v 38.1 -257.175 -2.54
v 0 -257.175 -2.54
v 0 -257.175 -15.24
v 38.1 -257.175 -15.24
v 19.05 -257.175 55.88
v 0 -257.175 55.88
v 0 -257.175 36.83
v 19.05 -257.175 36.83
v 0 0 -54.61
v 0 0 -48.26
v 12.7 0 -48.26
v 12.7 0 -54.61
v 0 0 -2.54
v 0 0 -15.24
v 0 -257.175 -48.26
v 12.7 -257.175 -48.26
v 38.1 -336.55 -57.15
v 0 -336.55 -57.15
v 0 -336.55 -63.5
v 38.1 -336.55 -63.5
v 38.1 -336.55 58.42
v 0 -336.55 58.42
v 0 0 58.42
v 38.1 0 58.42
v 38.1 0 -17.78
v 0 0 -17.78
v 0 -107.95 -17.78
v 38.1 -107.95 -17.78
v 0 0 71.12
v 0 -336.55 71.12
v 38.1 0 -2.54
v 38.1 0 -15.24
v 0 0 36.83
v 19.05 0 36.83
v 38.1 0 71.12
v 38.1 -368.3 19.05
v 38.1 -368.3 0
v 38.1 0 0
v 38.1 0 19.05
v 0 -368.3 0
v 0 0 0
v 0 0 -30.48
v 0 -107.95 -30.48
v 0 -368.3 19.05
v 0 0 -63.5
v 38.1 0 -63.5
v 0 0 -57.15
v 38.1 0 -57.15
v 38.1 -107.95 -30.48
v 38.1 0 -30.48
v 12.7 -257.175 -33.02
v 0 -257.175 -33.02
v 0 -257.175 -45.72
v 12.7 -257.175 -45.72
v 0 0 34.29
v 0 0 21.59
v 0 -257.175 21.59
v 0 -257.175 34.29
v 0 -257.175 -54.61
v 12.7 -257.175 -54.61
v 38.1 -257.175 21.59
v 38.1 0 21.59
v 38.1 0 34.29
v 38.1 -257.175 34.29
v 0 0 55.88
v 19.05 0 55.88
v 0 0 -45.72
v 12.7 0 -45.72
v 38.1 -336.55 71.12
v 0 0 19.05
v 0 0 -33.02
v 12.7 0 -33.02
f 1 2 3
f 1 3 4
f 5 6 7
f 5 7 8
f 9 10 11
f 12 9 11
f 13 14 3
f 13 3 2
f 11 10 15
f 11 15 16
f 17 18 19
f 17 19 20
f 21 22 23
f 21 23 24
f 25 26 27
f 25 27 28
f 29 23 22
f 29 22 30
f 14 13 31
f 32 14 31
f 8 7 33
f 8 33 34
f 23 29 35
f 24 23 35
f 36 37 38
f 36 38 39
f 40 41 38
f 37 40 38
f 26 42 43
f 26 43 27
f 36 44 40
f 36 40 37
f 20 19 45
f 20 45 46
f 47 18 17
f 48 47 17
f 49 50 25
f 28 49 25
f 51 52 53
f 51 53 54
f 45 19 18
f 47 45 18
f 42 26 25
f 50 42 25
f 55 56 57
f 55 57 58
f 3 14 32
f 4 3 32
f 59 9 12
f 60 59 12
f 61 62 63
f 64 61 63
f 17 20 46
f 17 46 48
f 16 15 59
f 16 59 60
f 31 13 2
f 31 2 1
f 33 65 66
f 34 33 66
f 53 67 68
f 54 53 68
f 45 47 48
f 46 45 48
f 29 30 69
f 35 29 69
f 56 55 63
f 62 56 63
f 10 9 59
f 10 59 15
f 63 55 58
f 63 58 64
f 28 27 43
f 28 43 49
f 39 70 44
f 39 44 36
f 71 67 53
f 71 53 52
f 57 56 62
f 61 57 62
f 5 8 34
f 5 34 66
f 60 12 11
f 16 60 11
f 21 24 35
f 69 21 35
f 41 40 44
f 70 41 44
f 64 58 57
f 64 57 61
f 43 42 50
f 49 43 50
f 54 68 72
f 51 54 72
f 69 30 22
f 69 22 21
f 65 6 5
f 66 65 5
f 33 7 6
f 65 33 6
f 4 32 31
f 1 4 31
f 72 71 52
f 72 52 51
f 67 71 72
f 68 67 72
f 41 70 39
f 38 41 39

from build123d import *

# Parameters (mm, degrees)
F0_W      = 38.1
F0_H      = 19.05
F1_DEPTH  = 368.3
F2_W      = 38.1
F2_H      = 12.7
F3_DEPTH  = 257.175
F4_W      = 19.05
F4_H      = 19.05
F5_DEPTH  = 257.175
F6_W      = 38.1
F6_H      = 12.7
F7_DEPTH  = 336.55
F8_W      = 38.1
F8_H      = 12.7
F9_DEPTH  = 257.175
F10_W     = 38.1
F10_H     = 12.7
F11_DEPTH = 107.95
F12_W     = 12.7
F12_H     = 12.7
F13_DEPTH = 257.175
F14_W     = 12.7
F14_H     = 6.35
F15_DEPTH = 257.175
F16_W     = 38.1
F16_H     = 6.35
F17_DEPTH = 336.55


with BuildPart() as f1:
    # F0 (on Front) → F1 (new body)
    with BuildSketch(Plane.XZ):
        with Locations((19.05, 9.525)):
            Rectangle(F0_W, F0_H)
    extrude(amount=F1_DEPTH)


with BuildPart() as f3:
    # F2 (on Front) → F3 (new body)
    with BuildSketch(Plane.XZ):
        with Locations((19.05, 27.94)):
            Rectangle(F2_W, F2_H)
    extrude(amount=F3_DEPTH)


with BuildPart() as f5:
    # F4 (on Front) → F5 (new body)
    with BuildSketch(Plane.XZ):
        with Locations((9.525, 46.355)):
            Rectangle(F4_W, F4_H)
    extrude(amount=F5_DEPTH)


with BuildPart() as f7:
    # F6 (on Front) → F7 (new body)
    with BuildSketch(Plane.XZ):
        with Locations((19.05, 64.77)):
            Rectangle(F6_W, F6_H)
    extrude(amount=F7_DEPTH)


with BuildPart() as f9:
    # F8 (on Front) → F9 (new body)
    with BuildSketch(Plane.XZ):
        with Locations((19.05, -8.89)):
            Rectangle(F8_W, F8_H)
    extrude(amount=F9_DEPTH)


with BuildPart() as f11:
    # F10 (on Front) → F11 (new body)
    with BuildSketch(Plane.XZ):
        with Locations((19.05, -24.13)):
            Rectangle(F10_W, F10_H)
    extrude(amount=F11_DEPTH)


with BuildPart() as f13:
    # F12 (on Front) → F13 (new body)
    with BuildSketch(Plane.XZ):
        with Locations((6.35, -39.37)):
            Rectangle(F12_W, F12_H)
    extrude(amount=F13_DEPTH)


with BuildPart() as f15:
    # F14 (on Front) → F15 (new body)
    with BuildSketch(Plane.XZ):
        with Locations((6.35, -51.435)):
            Rectangle(F14_W, F14_H)
    extrude(amount=F15_DEPTH)


with BuildPart() as f17:
    # F16 (on Front) → F17 (new body)
    with BuildSketch(Plane.XZ):
        with Locations((19.05, -60.325)):
            Rectangle(F16_W, F16_H)
    extrude(amount=F17_DEPTH)


solid = Compound([f1.part, f3.part, f5.part, f7.part, f9.part, f11.part, f13.part, f15.part, f17.part])
